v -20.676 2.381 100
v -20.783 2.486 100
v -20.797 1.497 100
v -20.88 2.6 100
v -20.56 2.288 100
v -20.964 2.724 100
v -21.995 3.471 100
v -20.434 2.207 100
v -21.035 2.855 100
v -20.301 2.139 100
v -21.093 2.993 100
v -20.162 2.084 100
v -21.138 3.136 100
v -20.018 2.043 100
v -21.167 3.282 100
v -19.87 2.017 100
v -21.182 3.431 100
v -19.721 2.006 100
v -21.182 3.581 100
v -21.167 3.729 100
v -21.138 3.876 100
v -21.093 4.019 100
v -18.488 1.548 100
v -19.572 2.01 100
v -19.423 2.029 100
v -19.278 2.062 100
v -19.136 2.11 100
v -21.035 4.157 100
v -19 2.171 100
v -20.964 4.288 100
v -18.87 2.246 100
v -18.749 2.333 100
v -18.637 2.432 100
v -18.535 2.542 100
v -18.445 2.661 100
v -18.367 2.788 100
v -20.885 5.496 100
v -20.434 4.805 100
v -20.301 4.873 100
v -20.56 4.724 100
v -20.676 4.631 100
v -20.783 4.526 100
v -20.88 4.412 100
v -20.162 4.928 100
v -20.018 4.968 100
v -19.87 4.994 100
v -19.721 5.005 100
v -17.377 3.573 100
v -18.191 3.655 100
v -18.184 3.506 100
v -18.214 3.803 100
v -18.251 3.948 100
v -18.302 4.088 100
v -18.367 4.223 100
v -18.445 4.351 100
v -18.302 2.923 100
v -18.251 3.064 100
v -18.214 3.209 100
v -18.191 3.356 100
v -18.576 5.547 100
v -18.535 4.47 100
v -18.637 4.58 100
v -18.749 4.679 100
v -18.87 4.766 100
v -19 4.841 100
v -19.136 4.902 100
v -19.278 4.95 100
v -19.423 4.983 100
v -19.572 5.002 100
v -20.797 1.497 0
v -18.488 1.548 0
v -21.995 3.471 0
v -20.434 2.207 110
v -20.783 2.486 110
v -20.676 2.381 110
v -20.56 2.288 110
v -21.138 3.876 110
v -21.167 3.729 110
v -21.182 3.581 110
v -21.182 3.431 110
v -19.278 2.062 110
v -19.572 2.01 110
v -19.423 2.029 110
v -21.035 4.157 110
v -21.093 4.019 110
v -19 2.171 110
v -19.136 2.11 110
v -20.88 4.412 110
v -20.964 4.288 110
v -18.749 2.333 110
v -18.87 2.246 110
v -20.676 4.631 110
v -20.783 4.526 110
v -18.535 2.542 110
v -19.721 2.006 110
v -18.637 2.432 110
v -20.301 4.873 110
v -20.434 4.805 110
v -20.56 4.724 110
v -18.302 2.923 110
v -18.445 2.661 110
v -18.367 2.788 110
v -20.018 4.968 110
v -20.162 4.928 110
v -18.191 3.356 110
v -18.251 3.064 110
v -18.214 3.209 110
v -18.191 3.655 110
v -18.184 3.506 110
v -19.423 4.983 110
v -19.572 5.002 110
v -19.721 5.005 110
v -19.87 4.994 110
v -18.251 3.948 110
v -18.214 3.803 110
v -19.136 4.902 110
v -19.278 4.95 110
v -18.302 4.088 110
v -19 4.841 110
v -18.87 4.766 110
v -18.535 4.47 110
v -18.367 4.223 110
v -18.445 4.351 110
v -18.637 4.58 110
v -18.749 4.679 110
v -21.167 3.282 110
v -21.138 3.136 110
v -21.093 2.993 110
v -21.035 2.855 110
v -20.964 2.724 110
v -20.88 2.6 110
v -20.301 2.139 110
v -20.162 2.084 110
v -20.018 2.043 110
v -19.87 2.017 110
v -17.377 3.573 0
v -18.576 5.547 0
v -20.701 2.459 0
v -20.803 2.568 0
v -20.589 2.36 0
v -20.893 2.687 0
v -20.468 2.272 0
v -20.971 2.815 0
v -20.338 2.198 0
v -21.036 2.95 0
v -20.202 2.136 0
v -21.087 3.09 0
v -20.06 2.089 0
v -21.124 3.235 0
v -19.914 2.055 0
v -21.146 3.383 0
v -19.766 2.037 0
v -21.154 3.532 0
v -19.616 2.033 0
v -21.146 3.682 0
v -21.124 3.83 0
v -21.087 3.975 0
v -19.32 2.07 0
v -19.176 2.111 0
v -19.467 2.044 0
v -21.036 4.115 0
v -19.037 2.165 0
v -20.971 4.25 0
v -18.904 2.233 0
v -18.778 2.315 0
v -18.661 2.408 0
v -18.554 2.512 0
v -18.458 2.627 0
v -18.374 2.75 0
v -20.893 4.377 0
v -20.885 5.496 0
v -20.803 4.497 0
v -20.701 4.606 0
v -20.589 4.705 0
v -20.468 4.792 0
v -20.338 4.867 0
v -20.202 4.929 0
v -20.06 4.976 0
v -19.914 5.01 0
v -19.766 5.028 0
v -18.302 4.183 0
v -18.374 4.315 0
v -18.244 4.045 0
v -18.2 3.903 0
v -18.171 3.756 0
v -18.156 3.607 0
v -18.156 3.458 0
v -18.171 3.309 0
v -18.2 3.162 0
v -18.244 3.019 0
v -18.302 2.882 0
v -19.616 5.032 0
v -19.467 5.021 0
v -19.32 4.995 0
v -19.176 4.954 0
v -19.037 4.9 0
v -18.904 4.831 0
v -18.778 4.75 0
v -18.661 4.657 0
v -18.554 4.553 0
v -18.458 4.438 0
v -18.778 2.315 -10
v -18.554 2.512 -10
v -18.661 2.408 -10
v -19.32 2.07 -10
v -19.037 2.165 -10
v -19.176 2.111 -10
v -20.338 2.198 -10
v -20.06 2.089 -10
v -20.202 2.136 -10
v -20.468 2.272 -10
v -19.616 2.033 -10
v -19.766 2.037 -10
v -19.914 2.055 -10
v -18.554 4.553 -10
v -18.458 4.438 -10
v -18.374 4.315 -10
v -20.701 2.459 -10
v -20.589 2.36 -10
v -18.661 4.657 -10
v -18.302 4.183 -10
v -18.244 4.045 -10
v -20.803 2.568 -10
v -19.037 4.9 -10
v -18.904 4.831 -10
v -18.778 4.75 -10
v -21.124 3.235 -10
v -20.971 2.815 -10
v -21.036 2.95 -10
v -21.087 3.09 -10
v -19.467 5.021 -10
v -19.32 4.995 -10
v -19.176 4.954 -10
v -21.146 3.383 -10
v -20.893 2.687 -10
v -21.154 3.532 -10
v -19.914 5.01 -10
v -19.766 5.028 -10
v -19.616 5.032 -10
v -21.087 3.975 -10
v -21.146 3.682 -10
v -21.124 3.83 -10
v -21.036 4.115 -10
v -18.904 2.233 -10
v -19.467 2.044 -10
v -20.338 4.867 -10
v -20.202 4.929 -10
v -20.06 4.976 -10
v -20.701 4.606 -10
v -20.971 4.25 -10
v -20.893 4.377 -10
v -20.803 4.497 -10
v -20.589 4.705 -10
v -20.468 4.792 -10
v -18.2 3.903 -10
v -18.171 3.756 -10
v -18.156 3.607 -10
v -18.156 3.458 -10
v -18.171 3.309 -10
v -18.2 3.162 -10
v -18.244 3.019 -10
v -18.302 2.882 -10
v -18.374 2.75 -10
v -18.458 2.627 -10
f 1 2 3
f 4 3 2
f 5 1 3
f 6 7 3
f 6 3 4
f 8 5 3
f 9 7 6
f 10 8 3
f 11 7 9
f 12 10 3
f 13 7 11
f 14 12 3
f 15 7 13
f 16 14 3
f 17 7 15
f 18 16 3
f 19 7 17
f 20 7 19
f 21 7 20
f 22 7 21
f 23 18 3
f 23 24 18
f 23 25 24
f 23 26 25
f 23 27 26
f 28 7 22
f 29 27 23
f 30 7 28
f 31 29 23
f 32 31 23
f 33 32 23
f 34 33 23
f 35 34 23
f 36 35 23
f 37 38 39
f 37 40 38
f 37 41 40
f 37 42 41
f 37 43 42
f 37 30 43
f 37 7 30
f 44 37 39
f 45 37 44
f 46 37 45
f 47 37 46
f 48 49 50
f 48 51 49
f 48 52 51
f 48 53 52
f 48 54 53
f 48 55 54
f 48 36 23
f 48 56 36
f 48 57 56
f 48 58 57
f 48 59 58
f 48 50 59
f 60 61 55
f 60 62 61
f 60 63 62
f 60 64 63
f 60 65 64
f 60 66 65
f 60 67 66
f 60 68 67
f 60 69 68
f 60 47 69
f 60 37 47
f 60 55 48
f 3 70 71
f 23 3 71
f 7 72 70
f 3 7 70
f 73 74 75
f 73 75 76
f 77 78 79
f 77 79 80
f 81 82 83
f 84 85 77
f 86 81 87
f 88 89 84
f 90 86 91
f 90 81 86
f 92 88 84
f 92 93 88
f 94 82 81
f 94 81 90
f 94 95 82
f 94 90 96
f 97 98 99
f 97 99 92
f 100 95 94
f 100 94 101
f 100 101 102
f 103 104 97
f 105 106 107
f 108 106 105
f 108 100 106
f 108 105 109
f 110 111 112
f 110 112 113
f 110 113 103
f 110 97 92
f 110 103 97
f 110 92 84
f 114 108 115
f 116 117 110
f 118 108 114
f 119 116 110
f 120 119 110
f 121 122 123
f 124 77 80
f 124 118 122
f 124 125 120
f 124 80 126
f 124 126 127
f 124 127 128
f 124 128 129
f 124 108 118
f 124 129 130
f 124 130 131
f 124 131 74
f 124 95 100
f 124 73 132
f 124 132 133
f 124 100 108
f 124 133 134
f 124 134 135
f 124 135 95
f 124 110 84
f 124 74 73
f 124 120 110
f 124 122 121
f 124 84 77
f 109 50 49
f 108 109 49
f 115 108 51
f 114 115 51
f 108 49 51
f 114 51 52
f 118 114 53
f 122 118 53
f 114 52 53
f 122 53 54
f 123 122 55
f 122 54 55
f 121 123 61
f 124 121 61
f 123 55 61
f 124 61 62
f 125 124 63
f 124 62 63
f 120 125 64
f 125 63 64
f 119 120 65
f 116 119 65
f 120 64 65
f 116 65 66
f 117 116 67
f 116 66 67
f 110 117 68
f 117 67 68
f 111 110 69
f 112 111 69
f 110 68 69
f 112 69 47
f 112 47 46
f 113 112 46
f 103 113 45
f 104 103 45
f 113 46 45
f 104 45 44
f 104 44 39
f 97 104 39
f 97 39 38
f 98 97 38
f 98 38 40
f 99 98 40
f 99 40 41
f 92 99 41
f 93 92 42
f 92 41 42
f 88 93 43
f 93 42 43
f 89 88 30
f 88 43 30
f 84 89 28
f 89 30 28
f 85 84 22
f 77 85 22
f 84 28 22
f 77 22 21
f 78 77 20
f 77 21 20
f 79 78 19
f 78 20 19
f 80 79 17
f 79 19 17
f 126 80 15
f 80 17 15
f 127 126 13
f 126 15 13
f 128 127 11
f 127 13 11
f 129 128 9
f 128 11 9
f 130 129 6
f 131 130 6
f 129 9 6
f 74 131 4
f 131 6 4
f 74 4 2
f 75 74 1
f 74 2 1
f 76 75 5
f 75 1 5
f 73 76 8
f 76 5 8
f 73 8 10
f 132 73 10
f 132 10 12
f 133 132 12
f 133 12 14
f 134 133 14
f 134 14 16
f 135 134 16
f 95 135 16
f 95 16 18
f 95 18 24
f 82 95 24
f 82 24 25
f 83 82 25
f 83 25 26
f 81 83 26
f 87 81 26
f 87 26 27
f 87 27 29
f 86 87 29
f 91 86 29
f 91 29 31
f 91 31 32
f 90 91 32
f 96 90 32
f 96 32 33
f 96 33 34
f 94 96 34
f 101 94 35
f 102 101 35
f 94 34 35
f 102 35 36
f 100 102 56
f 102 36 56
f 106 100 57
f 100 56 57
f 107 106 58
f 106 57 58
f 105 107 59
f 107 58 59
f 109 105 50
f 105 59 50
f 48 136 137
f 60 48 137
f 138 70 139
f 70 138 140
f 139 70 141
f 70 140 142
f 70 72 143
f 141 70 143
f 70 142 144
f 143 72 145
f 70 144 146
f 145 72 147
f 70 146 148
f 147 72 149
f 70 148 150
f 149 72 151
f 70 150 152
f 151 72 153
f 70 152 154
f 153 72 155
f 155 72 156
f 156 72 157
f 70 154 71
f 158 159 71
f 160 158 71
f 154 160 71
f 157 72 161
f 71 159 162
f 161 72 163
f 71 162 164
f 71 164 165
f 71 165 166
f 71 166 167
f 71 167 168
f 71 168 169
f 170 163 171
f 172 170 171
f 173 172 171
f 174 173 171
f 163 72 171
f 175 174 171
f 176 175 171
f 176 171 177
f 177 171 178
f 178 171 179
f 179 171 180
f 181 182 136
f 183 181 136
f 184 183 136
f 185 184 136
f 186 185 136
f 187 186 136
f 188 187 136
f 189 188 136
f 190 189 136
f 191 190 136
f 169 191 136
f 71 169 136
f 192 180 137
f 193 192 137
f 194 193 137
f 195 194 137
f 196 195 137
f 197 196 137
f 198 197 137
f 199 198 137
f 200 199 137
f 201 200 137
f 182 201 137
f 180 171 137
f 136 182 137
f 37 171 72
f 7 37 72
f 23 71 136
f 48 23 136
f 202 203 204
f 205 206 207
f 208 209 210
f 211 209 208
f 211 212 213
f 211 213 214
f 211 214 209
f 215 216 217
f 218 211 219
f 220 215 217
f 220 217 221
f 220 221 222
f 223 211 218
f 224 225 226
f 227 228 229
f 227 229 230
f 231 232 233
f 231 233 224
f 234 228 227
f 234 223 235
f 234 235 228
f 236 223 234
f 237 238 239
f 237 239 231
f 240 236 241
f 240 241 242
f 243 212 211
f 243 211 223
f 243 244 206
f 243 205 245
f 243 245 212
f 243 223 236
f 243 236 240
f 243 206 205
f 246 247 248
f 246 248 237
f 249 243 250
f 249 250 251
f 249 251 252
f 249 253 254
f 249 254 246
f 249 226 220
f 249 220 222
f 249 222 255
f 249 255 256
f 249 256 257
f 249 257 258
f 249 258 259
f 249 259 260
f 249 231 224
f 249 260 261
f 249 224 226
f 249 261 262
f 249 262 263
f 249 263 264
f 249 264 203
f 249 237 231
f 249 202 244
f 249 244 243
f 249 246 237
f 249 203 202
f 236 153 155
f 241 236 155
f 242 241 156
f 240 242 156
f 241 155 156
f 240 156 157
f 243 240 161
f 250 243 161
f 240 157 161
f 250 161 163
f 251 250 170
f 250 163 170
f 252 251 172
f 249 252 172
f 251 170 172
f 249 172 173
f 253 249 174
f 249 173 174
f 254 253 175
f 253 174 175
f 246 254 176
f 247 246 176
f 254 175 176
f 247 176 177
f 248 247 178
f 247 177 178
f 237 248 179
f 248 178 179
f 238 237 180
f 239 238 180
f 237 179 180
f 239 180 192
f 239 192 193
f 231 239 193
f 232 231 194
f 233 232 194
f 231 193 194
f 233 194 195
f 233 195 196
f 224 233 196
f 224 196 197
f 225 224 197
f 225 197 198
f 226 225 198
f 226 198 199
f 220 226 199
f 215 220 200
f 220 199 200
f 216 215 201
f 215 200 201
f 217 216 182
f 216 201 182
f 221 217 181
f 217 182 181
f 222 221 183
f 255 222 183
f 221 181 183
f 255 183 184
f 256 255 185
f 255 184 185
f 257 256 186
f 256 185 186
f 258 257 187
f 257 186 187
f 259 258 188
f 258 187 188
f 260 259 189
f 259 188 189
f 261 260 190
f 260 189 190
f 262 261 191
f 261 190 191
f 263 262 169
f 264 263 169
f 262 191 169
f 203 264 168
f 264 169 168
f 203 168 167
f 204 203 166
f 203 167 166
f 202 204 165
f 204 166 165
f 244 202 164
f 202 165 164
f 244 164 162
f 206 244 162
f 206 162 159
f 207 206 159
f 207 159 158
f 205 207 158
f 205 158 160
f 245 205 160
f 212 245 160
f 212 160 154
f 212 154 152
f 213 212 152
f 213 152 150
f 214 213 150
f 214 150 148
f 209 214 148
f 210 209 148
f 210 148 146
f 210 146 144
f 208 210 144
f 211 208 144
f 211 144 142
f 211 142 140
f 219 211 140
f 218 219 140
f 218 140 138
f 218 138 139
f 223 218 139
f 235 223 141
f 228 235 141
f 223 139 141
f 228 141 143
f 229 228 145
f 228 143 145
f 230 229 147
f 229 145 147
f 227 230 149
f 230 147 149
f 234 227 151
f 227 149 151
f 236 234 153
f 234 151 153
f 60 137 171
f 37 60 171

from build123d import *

# Parameters (mm, degrees)
BOSS_EXTRUDE1_DEPTH = 100
SKETCH3_R           = 1.5
BOSS_EXTRUDE2_DEPTH = 10
SKETCH4_R           = 1.5
BOSS_EXTRUDE3_DEPTH = 10


with BuildPart() as part:
    # Sketch2 → Boss-Extrude1 (new body)
    with BuildSketch(Plane.XY):
        Polygon((-18.575897145, 5.546778343), (-20.884739637, 5.495987805), (-21.995174987, 3.471076285), (-20.796767845, 1.496955302), (-18.487925352, 1.54774584), (-17.377490002, 3.57265736), align=None)
    extrude(amount=BOSS_EXTRUDE1_DEPTH)

    # Sketch3 → Boss-Extrude2 (add)
    with BuildSketch(Plane.XY.offset(100)):
        with Locations((-19.683896115, 3.505839662)):
            Circle(SKETCH3_R)
    extrude(amount=BOSS_EXTRUDE2_DEPTH)

    # Sketch4 → Boss-Extrude3 (add)
    with BuildSketch(Plane(origin=(0, 0, 0), x_dir=(-1, 0, 0), z_dir=(0, 0, -1))):
        with Locations((19.653785762, 3.532451742)):
            Circle(SKETCH4_R)
    extrude(amount=BOSS_EXTRUDE3_DEPTH)


solid = part.part
